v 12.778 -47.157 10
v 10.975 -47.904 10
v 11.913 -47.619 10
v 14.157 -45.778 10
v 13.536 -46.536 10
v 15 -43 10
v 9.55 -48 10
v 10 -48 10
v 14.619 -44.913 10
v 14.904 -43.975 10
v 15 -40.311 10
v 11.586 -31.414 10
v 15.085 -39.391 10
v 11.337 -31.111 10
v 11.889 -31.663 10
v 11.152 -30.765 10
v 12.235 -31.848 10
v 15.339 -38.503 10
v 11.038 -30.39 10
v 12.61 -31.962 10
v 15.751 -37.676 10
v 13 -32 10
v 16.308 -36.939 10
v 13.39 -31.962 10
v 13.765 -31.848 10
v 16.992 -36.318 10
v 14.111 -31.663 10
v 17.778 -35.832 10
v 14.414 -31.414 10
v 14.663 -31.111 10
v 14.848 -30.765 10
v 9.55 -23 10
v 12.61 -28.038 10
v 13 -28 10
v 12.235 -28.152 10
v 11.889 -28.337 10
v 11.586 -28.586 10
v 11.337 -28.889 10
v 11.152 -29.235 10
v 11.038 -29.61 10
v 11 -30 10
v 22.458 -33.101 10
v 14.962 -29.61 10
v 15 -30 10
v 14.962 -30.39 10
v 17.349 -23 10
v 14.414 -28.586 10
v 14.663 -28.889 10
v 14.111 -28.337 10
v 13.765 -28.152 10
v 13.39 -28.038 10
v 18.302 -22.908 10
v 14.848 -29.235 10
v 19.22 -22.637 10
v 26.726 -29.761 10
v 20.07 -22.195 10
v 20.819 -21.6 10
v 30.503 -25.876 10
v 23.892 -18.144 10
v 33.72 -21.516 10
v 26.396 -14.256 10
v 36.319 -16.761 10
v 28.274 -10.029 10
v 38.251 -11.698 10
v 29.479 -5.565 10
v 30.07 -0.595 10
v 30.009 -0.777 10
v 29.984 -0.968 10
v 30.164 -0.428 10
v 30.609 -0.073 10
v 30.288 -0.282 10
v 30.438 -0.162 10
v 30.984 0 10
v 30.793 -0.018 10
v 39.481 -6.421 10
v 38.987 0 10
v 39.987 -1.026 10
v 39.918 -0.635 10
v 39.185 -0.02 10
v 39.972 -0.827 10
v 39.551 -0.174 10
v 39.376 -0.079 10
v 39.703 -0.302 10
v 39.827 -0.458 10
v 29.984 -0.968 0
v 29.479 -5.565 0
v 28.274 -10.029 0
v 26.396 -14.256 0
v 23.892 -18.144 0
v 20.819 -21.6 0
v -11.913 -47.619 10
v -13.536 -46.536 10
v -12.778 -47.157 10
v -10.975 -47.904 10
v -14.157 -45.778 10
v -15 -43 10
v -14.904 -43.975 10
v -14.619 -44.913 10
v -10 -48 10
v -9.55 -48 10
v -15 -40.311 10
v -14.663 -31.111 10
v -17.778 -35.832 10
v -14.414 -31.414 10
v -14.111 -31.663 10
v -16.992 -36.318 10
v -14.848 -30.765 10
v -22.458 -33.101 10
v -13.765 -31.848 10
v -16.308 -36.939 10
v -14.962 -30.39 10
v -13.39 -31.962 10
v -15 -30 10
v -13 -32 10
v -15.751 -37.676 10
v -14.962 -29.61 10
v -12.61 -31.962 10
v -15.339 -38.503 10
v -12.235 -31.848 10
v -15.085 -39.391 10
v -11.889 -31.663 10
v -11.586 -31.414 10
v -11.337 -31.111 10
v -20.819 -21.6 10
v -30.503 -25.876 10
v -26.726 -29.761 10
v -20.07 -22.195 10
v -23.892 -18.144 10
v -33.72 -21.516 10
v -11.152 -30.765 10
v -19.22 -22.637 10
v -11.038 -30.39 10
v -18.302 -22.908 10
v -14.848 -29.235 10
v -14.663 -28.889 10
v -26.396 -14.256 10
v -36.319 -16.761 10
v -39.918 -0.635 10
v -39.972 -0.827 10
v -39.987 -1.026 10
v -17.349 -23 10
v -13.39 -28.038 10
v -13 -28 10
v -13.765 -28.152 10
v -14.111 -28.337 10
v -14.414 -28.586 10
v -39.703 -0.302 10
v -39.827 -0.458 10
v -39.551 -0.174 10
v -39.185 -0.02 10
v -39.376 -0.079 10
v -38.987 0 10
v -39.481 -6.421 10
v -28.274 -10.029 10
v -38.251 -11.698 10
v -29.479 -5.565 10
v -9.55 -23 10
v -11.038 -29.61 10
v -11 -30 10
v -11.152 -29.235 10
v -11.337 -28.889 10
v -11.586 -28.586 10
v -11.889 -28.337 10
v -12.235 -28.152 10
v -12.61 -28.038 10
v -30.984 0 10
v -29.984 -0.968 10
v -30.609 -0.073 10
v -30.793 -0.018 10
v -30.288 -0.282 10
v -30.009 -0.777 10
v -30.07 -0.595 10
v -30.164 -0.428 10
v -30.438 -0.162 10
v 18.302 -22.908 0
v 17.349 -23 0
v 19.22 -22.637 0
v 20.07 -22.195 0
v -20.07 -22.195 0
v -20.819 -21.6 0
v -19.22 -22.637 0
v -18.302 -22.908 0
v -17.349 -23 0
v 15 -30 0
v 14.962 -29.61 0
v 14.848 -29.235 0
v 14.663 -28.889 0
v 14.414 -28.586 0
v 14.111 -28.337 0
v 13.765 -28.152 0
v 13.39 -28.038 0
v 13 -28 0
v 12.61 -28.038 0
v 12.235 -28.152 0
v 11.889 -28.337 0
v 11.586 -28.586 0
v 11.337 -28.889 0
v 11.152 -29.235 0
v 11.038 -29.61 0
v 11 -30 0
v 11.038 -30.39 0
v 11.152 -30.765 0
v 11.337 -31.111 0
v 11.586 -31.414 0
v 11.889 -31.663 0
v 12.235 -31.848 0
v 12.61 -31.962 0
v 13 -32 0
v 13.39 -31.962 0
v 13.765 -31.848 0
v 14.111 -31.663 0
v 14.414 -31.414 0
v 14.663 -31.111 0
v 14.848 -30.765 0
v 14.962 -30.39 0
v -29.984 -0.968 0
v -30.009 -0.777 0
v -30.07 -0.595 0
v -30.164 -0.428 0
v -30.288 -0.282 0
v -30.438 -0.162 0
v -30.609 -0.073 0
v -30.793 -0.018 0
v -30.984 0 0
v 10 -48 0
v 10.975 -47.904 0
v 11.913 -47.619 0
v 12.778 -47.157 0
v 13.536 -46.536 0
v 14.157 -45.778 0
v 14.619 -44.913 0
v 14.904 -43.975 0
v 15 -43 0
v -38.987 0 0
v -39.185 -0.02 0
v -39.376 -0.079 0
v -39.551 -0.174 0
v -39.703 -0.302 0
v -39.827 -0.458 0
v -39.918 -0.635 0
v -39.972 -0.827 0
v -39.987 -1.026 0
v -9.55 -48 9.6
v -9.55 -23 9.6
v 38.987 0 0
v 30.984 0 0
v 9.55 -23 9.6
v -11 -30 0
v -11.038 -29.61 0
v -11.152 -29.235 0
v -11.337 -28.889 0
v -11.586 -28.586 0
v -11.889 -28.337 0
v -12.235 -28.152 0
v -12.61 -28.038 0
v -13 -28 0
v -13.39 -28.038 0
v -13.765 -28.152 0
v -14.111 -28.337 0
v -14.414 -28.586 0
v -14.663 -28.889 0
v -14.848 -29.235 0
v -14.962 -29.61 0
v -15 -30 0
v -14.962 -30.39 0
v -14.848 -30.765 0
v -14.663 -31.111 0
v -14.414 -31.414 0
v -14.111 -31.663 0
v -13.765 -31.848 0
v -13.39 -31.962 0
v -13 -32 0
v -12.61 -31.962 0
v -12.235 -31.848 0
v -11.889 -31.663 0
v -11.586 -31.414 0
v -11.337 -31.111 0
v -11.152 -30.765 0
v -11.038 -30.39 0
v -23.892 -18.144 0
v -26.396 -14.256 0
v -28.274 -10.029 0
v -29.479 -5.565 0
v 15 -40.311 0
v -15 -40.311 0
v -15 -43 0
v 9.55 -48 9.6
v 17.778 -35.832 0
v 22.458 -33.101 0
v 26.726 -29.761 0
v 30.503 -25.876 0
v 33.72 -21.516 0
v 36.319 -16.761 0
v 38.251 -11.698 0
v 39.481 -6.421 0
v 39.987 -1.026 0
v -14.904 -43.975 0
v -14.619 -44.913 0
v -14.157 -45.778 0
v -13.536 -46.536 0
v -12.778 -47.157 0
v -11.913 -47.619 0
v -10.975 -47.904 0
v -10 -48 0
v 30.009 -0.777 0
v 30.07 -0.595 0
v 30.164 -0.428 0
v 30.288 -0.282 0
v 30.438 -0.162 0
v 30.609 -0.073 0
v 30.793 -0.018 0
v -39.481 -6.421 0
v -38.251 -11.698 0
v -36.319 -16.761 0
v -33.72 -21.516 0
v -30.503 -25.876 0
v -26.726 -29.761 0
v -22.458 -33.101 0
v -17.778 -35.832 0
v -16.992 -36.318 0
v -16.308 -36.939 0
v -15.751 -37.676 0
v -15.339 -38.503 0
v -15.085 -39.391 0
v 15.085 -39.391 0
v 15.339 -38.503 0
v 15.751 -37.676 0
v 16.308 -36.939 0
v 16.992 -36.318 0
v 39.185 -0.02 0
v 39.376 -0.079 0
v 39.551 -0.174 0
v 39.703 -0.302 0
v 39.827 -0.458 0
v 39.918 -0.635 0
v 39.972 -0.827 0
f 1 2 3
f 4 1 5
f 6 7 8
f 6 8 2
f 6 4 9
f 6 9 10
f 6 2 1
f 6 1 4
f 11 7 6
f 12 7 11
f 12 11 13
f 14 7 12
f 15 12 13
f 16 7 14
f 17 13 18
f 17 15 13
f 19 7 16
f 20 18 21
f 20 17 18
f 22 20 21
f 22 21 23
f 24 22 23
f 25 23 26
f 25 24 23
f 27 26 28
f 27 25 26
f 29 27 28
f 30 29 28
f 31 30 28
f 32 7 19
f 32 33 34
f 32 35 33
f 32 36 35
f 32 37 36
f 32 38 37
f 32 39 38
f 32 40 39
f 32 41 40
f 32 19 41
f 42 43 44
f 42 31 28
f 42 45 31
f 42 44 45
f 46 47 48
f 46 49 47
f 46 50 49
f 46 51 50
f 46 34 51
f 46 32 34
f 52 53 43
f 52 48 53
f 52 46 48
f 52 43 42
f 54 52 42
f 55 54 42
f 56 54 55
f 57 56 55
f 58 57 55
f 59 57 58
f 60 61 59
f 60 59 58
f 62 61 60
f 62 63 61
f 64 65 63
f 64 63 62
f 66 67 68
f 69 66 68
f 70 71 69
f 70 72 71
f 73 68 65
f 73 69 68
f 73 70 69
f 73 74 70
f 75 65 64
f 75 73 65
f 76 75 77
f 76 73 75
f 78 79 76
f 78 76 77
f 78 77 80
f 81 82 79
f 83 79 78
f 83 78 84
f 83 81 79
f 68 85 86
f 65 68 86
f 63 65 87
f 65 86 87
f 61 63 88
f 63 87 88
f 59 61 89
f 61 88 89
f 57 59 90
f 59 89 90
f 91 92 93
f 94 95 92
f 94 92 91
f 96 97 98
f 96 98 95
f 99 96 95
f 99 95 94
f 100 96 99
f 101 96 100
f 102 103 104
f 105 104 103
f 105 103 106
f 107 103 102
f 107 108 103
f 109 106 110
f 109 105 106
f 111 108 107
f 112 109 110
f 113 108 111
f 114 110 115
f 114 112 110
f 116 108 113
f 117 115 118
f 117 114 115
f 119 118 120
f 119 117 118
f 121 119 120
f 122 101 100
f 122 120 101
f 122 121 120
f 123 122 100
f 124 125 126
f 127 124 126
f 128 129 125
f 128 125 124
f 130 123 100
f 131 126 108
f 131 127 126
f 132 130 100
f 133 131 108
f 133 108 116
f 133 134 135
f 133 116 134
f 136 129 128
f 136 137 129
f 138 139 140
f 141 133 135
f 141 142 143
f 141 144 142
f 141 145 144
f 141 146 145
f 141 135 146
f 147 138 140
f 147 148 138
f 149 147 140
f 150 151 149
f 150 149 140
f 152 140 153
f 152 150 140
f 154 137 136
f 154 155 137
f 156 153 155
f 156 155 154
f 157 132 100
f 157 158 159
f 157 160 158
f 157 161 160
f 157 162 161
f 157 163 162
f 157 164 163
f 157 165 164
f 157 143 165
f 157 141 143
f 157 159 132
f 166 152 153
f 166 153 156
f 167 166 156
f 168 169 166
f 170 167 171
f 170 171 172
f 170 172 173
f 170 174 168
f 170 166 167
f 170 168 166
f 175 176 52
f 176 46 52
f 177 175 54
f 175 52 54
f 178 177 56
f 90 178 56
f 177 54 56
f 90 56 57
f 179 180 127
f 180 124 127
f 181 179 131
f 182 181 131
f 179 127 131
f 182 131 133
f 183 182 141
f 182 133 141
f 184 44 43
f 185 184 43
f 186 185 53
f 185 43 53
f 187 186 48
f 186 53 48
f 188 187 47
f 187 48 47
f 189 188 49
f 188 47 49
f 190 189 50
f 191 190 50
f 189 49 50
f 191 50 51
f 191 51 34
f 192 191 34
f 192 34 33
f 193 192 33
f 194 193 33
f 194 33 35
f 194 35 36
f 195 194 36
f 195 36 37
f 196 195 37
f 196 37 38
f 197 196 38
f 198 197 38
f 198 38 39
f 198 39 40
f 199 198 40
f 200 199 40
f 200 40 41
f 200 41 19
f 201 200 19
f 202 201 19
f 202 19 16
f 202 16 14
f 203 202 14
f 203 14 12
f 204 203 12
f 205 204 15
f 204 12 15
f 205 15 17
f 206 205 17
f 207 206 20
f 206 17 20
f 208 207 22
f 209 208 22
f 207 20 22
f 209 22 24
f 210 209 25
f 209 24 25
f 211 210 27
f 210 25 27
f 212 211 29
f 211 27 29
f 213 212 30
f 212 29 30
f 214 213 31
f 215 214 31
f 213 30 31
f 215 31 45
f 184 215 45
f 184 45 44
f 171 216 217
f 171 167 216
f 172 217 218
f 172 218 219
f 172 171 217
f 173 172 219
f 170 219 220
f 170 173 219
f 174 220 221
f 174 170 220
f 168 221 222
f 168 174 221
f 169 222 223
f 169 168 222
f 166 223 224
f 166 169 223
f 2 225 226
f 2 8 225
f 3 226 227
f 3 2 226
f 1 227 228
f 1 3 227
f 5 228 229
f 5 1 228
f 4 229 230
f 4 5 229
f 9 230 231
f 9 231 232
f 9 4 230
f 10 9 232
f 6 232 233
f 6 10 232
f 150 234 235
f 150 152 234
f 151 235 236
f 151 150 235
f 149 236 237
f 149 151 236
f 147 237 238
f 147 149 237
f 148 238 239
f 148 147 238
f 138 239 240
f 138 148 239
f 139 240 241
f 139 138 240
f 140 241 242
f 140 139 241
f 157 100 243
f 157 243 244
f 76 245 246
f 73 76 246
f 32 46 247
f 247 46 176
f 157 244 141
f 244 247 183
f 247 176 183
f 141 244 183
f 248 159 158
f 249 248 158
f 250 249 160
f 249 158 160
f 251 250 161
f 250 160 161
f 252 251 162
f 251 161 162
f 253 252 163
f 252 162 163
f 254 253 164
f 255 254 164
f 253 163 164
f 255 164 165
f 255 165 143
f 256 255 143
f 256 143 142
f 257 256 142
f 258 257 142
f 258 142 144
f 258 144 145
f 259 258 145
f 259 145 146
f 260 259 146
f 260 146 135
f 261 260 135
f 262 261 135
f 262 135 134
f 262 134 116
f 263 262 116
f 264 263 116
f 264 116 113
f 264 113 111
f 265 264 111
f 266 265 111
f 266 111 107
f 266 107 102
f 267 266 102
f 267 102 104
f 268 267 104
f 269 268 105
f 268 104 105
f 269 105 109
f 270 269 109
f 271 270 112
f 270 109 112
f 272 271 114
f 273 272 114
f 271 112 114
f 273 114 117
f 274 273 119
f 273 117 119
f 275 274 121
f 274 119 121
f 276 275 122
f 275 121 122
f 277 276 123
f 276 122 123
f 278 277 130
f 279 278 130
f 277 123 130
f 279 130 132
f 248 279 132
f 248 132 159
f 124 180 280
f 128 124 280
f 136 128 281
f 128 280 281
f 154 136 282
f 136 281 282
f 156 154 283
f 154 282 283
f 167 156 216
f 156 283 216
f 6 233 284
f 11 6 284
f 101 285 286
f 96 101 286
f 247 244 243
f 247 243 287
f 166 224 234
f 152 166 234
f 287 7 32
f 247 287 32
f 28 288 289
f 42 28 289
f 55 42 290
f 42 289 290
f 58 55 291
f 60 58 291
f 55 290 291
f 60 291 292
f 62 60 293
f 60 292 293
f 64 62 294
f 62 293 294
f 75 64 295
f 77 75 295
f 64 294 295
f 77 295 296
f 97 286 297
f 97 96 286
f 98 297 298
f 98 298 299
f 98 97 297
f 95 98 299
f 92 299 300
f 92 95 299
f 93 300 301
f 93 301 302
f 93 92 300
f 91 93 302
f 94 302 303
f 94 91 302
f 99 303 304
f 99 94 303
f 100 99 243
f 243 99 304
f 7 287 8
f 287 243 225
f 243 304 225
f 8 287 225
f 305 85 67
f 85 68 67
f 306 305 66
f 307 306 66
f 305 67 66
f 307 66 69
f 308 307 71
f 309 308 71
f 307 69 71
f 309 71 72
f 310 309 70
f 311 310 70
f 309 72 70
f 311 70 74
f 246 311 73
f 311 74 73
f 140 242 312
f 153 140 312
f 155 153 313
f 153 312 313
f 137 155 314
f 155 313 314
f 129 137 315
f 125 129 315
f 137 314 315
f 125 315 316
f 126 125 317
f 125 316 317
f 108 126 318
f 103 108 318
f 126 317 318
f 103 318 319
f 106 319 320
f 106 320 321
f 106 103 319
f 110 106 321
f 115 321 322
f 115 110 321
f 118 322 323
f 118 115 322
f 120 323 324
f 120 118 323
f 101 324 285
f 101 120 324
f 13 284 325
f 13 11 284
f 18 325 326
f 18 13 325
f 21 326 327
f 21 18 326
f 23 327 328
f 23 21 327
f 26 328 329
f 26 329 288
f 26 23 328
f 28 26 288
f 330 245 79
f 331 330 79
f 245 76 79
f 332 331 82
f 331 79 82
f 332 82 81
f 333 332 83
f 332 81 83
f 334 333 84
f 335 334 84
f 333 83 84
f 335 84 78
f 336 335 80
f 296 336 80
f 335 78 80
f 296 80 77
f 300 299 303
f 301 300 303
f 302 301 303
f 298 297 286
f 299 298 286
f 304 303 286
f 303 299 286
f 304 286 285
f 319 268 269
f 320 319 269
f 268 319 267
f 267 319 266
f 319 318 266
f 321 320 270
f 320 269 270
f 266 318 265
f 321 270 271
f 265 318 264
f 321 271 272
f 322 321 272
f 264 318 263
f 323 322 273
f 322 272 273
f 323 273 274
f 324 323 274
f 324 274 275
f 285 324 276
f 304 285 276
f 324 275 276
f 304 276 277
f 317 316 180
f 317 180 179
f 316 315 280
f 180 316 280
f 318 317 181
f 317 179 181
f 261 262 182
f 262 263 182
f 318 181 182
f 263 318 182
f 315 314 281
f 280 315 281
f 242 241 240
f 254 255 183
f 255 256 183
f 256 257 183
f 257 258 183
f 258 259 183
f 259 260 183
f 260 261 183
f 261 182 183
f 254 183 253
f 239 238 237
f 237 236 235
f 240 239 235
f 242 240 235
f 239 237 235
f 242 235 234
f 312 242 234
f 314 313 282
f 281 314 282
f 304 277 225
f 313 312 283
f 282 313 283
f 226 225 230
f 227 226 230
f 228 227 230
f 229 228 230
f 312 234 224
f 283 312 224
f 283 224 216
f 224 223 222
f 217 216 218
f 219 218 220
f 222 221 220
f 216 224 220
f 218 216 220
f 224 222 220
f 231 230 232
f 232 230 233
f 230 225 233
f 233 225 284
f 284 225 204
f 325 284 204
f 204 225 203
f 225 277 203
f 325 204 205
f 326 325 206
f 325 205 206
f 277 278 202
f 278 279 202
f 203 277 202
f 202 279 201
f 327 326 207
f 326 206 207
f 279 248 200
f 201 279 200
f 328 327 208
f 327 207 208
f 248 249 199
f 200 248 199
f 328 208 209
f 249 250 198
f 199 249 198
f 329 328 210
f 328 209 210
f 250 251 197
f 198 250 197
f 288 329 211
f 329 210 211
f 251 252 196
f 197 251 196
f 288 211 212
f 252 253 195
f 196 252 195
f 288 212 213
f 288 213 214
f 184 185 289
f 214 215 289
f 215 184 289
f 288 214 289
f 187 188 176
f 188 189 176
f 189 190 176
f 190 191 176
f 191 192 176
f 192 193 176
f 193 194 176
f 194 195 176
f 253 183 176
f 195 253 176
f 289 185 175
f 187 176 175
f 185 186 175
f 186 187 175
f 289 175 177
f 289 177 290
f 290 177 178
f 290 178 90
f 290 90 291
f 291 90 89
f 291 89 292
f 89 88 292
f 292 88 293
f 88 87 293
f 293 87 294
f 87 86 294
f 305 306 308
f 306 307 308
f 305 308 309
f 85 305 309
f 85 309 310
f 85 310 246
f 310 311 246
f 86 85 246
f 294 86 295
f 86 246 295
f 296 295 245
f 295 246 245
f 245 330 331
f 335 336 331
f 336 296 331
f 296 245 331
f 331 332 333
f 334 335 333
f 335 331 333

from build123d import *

# Parameters (mm, degrees)
F1_DEPTH = 10
F2_W     = 19.1
F2_H     = 25
F3_DEPTH = 0.4
F4_R     = 2
F5_DEPTH = 10.001
F6_R     = 5
F7_R     = 1


with BuildPart() as f1:
    # F0 (on Top) → F1 (new body)
    with BuildSketch(Plane.XY):
        with BuildLine():
            Line((-30, 0), (-40, 0))
            ThreePointArc((-40, 0), (-33.166248, -22.36068), (-15, -37.080992))
            Line((-15, -37.080992), (-15, -48))
            Line((-15, -48), (15, -48))
            Line((15, -48), (15, -37.080992))
            ThreePointArc((15, -37.080992), (33.166248, -22.36068), (40, 0))
            Line((40, 0), (30, 0))
            ThreePointArc((30, 0), (27.18309, -12.691714), (19.26136, -23))
            Line((19.26136, -23), (-19.26136, -23))
            ThreePointArc((-19.26136, -23), (-27.18309, -12.691714), (-30, 0))
        make_face()
    extrude(amount=F1_DEPTH)

    # F2 (on face) → F3 (cut)
    with BuildSketch(Plane.XY.offset(10)):
        with Locations((0, -35.5)):
            Rectangle(F2_W, F2_H)
    extrude(amount=-F3_DEPTH, mode=Mode.SUBTRACT)

    # F4 (on face) → F5 (cut, through all)
    with BuildSketch(Plane.XY.offset(10)):
        with Locations((-13, -30)):
            Circle(F4_R)
        with Locations((13, -30)):
            Circle(F4_R)
    extrude(amount=-F5_DEPTH, mode=Mode.SUBTRACT)

    # F6
    f6_edges = [f1.edges().sort_by_distance(p)[0] for p in [
        (-19.26136, -23, 5),
        (19.26136, -23, 5),
        (15, -37.080992, 5),
        (-15, -37.080992, 5),
        (-15, -48, 5),
        (15, -48, 5),
    ]]
    fillet(f6_edges, radius=F6_R)

    # F7
    f7_edges = [f1.edges().sort_by_distance(p)[0] for p in [
        (-40, 0, 5),
        (-30, 0, 5),
        (30, 0, 5),
        (40, 0, 5),
    ]]
    fillet(f7_edges, radius=F7_R)


solid = f1.part
